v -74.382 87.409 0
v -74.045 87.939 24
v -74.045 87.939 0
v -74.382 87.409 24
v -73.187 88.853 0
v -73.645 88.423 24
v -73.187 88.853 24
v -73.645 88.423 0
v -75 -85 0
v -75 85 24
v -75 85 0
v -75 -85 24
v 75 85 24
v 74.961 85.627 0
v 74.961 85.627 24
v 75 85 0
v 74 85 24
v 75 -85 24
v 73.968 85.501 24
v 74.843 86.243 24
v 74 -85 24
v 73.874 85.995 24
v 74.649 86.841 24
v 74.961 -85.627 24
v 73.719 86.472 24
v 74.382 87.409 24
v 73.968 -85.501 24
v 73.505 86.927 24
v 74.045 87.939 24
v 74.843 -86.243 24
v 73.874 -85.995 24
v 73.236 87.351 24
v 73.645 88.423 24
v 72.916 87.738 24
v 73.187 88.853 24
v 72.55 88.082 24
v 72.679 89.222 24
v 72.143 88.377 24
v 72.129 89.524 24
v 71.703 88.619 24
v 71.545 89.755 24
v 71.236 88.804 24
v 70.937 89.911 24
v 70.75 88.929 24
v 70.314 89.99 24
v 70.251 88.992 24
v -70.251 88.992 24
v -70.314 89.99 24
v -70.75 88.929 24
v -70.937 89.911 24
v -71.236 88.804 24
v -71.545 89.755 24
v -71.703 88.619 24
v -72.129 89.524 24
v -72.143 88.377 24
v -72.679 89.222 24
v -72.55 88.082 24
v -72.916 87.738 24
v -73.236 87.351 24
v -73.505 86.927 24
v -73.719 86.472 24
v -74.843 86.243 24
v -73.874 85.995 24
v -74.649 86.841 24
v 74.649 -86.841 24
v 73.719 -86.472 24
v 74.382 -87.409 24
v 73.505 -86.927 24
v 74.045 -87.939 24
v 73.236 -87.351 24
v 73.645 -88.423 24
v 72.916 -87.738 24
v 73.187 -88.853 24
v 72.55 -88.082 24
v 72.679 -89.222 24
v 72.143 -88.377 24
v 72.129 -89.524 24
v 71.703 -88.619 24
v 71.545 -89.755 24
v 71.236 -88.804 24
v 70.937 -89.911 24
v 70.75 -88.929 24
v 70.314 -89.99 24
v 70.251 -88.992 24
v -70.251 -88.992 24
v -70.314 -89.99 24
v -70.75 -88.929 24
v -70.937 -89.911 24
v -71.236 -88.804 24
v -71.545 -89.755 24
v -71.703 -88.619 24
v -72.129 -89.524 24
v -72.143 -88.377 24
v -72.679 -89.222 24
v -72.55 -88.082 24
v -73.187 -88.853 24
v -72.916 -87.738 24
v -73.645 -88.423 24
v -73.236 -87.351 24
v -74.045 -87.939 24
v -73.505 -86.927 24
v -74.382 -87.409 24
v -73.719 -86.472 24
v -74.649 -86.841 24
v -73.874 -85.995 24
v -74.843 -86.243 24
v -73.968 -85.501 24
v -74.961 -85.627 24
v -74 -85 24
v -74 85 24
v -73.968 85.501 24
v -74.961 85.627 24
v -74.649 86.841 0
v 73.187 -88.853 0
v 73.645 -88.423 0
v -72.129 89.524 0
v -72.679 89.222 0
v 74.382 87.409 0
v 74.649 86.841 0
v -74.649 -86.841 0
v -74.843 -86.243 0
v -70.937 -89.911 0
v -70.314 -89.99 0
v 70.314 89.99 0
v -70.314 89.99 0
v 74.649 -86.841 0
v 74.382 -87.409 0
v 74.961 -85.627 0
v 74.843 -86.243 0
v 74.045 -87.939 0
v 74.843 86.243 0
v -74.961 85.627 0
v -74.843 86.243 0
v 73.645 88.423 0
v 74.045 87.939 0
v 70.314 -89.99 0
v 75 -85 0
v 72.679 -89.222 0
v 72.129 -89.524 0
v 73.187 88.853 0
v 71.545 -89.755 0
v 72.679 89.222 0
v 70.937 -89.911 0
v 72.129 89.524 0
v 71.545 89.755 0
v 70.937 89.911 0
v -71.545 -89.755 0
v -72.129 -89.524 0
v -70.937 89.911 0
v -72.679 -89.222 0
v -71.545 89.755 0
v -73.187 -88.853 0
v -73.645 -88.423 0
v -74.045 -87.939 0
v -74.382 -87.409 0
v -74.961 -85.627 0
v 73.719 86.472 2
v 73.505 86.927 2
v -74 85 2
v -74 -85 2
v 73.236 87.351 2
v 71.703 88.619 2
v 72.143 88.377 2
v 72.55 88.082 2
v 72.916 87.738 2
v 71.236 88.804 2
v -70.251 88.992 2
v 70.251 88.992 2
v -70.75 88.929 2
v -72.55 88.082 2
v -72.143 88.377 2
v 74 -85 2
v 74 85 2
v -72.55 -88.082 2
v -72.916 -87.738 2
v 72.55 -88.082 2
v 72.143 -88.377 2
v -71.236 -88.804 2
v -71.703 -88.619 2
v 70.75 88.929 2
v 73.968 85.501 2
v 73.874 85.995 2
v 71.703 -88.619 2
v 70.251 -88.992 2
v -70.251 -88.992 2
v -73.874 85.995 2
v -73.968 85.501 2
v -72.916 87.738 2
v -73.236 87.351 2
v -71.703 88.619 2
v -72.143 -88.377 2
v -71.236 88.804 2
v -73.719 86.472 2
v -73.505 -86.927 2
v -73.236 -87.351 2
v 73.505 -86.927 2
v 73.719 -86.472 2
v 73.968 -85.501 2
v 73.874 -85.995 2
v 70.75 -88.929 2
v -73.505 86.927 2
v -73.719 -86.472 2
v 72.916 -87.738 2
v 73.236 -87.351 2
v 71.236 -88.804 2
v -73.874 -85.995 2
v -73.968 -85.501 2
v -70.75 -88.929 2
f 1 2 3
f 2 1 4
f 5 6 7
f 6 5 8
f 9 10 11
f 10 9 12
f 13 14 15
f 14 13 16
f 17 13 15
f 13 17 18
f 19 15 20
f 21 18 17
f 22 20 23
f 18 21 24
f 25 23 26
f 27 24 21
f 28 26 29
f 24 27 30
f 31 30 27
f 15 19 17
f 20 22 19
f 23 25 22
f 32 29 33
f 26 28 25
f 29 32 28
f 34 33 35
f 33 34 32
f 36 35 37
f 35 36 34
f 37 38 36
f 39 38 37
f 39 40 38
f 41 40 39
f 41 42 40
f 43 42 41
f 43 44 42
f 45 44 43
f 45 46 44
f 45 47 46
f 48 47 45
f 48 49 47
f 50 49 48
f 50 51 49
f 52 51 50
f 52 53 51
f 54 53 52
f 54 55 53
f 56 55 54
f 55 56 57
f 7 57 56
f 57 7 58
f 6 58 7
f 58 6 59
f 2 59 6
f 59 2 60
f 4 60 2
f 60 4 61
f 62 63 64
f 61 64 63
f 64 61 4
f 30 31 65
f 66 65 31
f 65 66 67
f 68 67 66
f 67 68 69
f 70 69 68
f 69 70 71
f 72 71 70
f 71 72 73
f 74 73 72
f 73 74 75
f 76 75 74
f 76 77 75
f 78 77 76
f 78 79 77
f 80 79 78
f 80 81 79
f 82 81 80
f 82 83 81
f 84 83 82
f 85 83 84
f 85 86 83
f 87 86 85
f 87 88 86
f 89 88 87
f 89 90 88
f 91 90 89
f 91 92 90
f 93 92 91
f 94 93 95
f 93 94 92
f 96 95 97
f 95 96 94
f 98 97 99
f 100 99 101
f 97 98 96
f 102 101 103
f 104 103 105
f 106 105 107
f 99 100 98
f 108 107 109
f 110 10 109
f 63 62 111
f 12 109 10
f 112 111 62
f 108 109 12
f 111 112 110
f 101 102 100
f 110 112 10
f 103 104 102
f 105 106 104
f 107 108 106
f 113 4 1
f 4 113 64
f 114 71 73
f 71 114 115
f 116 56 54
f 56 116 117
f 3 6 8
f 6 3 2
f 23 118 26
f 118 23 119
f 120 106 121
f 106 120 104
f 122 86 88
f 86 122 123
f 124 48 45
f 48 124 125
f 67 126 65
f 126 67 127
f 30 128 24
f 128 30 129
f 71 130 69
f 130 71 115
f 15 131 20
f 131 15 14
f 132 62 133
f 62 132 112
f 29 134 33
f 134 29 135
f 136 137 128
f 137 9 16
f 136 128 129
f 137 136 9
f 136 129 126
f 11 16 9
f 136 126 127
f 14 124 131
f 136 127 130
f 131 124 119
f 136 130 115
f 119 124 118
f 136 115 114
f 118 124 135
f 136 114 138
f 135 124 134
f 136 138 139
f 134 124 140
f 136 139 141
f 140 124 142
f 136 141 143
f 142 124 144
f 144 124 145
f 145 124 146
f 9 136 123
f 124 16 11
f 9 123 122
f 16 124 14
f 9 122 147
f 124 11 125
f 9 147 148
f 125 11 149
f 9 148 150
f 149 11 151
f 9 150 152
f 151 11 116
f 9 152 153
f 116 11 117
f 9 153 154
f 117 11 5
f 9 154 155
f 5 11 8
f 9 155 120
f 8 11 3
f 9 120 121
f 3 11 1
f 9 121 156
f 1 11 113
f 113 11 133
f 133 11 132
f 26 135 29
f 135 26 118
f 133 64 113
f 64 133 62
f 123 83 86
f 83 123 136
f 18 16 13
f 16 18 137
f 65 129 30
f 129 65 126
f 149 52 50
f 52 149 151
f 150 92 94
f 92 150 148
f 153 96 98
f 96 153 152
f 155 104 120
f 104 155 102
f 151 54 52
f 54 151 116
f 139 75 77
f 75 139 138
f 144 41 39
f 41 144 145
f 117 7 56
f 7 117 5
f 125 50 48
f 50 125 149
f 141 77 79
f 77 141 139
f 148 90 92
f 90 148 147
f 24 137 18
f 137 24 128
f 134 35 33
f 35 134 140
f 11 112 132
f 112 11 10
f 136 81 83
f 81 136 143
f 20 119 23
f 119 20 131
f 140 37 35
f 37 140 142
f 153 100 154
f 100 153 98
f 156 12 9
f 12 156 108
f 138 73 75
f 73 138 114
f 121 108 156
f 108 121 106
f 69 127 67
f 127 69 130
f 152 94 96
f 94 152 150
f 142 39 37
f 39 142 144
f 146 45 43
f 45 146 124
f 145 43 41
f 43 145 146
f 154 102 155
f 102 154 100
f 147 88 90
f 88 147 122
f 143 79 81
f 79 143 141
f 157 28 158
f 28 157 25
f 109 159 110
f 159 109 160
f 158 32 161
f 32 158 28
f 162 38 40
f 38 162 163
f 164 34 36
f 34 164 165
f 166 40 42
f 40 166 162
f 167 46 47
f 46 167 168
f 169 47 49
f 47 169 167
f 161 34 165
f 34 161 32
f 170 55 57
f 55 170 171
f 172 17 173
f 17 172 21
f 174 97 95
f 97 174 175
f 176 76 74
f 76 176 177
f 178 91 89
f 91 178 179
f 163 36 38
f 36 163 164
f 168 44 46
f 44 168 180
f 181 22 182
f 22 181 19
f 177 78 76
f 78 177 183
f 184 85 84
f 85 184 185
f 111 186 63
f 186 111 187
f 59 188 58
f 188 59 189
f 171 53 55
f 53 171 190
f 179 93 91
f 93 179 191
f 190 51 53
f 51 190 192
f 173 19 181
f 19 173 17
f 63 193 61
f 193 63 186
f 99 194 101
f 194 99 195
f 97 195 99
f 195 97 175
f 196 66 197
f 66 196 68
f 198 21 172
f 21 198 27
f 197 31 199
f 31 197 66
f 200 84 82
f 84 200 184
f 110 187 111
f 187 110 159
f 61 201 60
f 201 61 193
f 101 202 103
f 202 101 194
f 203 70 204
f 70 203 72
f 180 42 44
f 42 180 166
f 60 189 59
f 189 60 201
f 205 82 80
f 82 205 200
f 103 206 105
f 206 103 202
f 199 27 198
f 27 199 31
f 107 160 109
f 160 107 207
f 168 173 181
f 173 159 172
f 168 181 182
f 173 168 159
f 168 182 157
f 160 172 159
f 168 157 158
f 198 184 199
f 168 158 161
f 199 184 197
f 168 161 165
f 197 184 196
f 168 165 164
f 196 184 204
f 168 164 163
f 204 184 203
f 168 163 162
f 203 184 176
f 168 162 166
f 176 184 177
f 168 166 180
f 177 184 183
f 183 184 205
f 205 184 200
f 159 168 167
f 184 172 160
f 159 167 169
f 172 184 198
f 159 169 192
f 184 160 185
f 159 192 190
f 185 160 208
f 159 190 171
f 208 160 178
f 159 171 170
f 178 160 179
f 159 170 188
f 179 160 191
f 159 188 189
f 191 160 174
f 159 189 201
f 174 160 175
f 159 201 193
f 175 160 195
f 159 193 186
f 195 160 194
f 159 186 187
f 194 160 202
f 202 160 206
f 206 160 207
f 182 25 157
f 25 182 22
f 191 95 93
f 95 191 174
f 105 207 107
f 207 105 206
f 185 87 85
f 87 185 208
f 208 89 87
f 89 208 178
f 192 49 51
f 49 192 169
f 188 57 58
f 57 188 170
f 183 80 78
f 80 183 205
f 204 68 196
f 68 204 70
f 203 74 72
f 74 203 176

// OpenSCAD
$fn = 50;


difference() {
	union() {
		hull() {
			translate(v = [-70.0000000000, 85.0000000000, 0]) {
				cylinder(h = 24, r = 5);
			}
			translate(v = [70.0000000000, 85.0000000000, 0]) {
				cylinder(h = 24, r = 5);
			}
			translate(v = [-70.0000000000, -85.0000000000, 0]) {
				cylinder(h = 24, r = 5);
			}
			translate(v = [70.0000000000, -85.0000000000, 0]) {
				cylinder(h = 24, r = 5);
			}
		}
	}
	union() {
		translate(v = [0, 0, 2]) {
			hull() {
				translate(v = [-70.0000000000, 85.0000000000, 0]) {
					cylinder(h = 22, r = 4);
				}
				translate(v = [70.0000000000, 85.0000000000, 0]) {
					cylinder(h = 22, r = 4);
				}
				translate(v = [-70.0000000000, -85.0000000000, 0]) {
					cylinder(h = 22, r = 4);
				}
				translate(v = [70.0000000000, -85.0000000000, 0]) {
					cylinder(h = 22, r = 4);
				}
			}
		}
	}
}
